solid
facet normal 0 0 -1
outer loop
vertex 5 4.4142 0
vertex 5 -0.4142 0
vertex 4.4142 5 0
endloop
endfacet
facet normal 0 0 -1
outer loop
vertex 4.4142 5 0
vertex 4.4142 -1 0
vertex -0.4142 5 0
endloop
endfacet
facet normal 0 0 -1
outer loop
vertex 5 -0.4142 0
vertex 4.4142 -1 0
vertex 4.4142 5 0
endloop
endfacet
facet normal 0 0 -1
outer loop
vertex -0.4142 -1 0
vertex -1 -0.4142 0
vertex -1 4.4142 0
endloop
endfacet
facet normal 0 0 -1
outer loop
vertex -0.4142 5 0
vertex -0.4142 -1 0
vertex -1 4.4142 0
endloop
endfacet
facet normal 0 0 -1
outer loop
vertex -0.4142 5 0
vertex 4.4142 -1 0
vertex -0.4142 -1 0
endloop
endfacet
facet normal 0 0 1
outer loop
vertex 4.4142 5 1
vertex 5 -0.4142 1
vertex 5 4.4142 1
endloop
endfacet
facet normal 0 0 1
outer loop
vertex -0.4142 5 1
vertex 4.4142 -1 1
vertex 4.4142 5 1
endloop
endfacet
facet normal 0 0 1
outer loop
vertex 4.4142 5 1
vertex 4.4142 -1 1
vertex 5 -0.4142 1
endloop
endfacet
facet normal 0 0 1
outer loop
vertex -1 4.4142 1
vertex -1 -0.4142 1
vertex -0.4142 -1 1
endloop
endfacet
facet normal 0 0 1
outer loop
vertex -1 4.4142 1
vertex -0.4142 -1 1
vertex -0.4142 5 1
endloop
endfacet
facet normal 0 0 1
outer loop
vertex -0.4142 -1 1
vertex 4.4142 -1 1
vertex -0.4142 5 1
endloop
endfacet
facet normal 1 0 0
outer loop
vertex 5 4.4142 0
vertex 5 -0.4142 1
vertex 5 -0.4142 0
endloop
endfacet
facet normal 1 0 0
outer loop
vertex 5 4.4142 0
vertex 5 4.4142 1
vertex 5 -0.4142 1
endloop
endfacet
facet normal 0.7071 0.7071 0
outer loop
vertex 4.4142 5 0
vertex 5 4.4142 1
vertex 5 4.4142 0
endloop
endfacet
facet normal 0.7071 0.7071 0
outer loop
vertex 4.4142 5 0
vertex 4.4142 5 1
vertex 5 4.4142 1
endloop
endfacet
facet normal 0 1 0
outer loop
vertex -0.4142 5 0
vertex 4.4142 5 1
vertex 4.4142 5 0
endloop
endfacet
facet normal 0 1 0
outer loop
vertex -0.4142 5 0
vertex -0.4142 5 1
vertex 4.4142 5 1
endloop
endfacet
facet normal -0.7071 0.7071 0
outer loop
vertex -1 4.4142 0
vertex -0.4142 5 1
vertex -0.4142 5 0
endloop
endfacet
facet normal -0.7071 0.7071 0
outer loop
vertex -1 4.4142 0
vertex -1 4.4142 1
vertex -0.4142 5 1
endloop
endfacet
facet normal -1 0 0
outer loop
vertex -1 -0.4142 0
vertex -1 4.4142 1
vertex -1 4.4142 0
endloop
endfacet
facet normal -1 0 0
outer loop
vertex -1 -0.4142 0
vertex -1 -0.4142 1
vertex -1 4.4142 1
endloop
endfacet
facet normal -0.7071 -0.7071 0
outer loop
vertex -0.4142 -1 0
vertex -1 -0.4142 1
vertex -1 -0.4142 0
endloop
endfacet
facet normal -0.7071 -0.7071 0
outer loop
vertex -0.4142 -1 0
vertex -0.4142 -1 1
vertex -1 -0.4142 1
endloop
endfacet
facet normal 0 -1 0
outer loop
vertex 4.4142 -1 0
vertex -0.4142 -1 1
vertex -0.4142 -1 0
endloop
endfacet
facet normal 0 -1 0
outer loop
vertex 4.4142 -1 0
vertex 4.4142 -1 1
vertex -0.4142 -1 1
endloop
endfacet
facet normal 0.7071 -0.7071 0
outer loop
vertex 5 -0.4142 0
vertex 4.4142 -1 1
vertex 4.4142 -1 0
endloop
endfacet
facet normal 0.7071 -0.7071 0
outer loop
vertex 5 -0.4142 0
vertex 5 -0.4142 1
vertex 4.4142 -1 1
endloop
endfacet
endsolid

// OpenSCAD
// chamfered offset
linear_extrude(1) offset(delta = 1, chamfer = true) square(4);
